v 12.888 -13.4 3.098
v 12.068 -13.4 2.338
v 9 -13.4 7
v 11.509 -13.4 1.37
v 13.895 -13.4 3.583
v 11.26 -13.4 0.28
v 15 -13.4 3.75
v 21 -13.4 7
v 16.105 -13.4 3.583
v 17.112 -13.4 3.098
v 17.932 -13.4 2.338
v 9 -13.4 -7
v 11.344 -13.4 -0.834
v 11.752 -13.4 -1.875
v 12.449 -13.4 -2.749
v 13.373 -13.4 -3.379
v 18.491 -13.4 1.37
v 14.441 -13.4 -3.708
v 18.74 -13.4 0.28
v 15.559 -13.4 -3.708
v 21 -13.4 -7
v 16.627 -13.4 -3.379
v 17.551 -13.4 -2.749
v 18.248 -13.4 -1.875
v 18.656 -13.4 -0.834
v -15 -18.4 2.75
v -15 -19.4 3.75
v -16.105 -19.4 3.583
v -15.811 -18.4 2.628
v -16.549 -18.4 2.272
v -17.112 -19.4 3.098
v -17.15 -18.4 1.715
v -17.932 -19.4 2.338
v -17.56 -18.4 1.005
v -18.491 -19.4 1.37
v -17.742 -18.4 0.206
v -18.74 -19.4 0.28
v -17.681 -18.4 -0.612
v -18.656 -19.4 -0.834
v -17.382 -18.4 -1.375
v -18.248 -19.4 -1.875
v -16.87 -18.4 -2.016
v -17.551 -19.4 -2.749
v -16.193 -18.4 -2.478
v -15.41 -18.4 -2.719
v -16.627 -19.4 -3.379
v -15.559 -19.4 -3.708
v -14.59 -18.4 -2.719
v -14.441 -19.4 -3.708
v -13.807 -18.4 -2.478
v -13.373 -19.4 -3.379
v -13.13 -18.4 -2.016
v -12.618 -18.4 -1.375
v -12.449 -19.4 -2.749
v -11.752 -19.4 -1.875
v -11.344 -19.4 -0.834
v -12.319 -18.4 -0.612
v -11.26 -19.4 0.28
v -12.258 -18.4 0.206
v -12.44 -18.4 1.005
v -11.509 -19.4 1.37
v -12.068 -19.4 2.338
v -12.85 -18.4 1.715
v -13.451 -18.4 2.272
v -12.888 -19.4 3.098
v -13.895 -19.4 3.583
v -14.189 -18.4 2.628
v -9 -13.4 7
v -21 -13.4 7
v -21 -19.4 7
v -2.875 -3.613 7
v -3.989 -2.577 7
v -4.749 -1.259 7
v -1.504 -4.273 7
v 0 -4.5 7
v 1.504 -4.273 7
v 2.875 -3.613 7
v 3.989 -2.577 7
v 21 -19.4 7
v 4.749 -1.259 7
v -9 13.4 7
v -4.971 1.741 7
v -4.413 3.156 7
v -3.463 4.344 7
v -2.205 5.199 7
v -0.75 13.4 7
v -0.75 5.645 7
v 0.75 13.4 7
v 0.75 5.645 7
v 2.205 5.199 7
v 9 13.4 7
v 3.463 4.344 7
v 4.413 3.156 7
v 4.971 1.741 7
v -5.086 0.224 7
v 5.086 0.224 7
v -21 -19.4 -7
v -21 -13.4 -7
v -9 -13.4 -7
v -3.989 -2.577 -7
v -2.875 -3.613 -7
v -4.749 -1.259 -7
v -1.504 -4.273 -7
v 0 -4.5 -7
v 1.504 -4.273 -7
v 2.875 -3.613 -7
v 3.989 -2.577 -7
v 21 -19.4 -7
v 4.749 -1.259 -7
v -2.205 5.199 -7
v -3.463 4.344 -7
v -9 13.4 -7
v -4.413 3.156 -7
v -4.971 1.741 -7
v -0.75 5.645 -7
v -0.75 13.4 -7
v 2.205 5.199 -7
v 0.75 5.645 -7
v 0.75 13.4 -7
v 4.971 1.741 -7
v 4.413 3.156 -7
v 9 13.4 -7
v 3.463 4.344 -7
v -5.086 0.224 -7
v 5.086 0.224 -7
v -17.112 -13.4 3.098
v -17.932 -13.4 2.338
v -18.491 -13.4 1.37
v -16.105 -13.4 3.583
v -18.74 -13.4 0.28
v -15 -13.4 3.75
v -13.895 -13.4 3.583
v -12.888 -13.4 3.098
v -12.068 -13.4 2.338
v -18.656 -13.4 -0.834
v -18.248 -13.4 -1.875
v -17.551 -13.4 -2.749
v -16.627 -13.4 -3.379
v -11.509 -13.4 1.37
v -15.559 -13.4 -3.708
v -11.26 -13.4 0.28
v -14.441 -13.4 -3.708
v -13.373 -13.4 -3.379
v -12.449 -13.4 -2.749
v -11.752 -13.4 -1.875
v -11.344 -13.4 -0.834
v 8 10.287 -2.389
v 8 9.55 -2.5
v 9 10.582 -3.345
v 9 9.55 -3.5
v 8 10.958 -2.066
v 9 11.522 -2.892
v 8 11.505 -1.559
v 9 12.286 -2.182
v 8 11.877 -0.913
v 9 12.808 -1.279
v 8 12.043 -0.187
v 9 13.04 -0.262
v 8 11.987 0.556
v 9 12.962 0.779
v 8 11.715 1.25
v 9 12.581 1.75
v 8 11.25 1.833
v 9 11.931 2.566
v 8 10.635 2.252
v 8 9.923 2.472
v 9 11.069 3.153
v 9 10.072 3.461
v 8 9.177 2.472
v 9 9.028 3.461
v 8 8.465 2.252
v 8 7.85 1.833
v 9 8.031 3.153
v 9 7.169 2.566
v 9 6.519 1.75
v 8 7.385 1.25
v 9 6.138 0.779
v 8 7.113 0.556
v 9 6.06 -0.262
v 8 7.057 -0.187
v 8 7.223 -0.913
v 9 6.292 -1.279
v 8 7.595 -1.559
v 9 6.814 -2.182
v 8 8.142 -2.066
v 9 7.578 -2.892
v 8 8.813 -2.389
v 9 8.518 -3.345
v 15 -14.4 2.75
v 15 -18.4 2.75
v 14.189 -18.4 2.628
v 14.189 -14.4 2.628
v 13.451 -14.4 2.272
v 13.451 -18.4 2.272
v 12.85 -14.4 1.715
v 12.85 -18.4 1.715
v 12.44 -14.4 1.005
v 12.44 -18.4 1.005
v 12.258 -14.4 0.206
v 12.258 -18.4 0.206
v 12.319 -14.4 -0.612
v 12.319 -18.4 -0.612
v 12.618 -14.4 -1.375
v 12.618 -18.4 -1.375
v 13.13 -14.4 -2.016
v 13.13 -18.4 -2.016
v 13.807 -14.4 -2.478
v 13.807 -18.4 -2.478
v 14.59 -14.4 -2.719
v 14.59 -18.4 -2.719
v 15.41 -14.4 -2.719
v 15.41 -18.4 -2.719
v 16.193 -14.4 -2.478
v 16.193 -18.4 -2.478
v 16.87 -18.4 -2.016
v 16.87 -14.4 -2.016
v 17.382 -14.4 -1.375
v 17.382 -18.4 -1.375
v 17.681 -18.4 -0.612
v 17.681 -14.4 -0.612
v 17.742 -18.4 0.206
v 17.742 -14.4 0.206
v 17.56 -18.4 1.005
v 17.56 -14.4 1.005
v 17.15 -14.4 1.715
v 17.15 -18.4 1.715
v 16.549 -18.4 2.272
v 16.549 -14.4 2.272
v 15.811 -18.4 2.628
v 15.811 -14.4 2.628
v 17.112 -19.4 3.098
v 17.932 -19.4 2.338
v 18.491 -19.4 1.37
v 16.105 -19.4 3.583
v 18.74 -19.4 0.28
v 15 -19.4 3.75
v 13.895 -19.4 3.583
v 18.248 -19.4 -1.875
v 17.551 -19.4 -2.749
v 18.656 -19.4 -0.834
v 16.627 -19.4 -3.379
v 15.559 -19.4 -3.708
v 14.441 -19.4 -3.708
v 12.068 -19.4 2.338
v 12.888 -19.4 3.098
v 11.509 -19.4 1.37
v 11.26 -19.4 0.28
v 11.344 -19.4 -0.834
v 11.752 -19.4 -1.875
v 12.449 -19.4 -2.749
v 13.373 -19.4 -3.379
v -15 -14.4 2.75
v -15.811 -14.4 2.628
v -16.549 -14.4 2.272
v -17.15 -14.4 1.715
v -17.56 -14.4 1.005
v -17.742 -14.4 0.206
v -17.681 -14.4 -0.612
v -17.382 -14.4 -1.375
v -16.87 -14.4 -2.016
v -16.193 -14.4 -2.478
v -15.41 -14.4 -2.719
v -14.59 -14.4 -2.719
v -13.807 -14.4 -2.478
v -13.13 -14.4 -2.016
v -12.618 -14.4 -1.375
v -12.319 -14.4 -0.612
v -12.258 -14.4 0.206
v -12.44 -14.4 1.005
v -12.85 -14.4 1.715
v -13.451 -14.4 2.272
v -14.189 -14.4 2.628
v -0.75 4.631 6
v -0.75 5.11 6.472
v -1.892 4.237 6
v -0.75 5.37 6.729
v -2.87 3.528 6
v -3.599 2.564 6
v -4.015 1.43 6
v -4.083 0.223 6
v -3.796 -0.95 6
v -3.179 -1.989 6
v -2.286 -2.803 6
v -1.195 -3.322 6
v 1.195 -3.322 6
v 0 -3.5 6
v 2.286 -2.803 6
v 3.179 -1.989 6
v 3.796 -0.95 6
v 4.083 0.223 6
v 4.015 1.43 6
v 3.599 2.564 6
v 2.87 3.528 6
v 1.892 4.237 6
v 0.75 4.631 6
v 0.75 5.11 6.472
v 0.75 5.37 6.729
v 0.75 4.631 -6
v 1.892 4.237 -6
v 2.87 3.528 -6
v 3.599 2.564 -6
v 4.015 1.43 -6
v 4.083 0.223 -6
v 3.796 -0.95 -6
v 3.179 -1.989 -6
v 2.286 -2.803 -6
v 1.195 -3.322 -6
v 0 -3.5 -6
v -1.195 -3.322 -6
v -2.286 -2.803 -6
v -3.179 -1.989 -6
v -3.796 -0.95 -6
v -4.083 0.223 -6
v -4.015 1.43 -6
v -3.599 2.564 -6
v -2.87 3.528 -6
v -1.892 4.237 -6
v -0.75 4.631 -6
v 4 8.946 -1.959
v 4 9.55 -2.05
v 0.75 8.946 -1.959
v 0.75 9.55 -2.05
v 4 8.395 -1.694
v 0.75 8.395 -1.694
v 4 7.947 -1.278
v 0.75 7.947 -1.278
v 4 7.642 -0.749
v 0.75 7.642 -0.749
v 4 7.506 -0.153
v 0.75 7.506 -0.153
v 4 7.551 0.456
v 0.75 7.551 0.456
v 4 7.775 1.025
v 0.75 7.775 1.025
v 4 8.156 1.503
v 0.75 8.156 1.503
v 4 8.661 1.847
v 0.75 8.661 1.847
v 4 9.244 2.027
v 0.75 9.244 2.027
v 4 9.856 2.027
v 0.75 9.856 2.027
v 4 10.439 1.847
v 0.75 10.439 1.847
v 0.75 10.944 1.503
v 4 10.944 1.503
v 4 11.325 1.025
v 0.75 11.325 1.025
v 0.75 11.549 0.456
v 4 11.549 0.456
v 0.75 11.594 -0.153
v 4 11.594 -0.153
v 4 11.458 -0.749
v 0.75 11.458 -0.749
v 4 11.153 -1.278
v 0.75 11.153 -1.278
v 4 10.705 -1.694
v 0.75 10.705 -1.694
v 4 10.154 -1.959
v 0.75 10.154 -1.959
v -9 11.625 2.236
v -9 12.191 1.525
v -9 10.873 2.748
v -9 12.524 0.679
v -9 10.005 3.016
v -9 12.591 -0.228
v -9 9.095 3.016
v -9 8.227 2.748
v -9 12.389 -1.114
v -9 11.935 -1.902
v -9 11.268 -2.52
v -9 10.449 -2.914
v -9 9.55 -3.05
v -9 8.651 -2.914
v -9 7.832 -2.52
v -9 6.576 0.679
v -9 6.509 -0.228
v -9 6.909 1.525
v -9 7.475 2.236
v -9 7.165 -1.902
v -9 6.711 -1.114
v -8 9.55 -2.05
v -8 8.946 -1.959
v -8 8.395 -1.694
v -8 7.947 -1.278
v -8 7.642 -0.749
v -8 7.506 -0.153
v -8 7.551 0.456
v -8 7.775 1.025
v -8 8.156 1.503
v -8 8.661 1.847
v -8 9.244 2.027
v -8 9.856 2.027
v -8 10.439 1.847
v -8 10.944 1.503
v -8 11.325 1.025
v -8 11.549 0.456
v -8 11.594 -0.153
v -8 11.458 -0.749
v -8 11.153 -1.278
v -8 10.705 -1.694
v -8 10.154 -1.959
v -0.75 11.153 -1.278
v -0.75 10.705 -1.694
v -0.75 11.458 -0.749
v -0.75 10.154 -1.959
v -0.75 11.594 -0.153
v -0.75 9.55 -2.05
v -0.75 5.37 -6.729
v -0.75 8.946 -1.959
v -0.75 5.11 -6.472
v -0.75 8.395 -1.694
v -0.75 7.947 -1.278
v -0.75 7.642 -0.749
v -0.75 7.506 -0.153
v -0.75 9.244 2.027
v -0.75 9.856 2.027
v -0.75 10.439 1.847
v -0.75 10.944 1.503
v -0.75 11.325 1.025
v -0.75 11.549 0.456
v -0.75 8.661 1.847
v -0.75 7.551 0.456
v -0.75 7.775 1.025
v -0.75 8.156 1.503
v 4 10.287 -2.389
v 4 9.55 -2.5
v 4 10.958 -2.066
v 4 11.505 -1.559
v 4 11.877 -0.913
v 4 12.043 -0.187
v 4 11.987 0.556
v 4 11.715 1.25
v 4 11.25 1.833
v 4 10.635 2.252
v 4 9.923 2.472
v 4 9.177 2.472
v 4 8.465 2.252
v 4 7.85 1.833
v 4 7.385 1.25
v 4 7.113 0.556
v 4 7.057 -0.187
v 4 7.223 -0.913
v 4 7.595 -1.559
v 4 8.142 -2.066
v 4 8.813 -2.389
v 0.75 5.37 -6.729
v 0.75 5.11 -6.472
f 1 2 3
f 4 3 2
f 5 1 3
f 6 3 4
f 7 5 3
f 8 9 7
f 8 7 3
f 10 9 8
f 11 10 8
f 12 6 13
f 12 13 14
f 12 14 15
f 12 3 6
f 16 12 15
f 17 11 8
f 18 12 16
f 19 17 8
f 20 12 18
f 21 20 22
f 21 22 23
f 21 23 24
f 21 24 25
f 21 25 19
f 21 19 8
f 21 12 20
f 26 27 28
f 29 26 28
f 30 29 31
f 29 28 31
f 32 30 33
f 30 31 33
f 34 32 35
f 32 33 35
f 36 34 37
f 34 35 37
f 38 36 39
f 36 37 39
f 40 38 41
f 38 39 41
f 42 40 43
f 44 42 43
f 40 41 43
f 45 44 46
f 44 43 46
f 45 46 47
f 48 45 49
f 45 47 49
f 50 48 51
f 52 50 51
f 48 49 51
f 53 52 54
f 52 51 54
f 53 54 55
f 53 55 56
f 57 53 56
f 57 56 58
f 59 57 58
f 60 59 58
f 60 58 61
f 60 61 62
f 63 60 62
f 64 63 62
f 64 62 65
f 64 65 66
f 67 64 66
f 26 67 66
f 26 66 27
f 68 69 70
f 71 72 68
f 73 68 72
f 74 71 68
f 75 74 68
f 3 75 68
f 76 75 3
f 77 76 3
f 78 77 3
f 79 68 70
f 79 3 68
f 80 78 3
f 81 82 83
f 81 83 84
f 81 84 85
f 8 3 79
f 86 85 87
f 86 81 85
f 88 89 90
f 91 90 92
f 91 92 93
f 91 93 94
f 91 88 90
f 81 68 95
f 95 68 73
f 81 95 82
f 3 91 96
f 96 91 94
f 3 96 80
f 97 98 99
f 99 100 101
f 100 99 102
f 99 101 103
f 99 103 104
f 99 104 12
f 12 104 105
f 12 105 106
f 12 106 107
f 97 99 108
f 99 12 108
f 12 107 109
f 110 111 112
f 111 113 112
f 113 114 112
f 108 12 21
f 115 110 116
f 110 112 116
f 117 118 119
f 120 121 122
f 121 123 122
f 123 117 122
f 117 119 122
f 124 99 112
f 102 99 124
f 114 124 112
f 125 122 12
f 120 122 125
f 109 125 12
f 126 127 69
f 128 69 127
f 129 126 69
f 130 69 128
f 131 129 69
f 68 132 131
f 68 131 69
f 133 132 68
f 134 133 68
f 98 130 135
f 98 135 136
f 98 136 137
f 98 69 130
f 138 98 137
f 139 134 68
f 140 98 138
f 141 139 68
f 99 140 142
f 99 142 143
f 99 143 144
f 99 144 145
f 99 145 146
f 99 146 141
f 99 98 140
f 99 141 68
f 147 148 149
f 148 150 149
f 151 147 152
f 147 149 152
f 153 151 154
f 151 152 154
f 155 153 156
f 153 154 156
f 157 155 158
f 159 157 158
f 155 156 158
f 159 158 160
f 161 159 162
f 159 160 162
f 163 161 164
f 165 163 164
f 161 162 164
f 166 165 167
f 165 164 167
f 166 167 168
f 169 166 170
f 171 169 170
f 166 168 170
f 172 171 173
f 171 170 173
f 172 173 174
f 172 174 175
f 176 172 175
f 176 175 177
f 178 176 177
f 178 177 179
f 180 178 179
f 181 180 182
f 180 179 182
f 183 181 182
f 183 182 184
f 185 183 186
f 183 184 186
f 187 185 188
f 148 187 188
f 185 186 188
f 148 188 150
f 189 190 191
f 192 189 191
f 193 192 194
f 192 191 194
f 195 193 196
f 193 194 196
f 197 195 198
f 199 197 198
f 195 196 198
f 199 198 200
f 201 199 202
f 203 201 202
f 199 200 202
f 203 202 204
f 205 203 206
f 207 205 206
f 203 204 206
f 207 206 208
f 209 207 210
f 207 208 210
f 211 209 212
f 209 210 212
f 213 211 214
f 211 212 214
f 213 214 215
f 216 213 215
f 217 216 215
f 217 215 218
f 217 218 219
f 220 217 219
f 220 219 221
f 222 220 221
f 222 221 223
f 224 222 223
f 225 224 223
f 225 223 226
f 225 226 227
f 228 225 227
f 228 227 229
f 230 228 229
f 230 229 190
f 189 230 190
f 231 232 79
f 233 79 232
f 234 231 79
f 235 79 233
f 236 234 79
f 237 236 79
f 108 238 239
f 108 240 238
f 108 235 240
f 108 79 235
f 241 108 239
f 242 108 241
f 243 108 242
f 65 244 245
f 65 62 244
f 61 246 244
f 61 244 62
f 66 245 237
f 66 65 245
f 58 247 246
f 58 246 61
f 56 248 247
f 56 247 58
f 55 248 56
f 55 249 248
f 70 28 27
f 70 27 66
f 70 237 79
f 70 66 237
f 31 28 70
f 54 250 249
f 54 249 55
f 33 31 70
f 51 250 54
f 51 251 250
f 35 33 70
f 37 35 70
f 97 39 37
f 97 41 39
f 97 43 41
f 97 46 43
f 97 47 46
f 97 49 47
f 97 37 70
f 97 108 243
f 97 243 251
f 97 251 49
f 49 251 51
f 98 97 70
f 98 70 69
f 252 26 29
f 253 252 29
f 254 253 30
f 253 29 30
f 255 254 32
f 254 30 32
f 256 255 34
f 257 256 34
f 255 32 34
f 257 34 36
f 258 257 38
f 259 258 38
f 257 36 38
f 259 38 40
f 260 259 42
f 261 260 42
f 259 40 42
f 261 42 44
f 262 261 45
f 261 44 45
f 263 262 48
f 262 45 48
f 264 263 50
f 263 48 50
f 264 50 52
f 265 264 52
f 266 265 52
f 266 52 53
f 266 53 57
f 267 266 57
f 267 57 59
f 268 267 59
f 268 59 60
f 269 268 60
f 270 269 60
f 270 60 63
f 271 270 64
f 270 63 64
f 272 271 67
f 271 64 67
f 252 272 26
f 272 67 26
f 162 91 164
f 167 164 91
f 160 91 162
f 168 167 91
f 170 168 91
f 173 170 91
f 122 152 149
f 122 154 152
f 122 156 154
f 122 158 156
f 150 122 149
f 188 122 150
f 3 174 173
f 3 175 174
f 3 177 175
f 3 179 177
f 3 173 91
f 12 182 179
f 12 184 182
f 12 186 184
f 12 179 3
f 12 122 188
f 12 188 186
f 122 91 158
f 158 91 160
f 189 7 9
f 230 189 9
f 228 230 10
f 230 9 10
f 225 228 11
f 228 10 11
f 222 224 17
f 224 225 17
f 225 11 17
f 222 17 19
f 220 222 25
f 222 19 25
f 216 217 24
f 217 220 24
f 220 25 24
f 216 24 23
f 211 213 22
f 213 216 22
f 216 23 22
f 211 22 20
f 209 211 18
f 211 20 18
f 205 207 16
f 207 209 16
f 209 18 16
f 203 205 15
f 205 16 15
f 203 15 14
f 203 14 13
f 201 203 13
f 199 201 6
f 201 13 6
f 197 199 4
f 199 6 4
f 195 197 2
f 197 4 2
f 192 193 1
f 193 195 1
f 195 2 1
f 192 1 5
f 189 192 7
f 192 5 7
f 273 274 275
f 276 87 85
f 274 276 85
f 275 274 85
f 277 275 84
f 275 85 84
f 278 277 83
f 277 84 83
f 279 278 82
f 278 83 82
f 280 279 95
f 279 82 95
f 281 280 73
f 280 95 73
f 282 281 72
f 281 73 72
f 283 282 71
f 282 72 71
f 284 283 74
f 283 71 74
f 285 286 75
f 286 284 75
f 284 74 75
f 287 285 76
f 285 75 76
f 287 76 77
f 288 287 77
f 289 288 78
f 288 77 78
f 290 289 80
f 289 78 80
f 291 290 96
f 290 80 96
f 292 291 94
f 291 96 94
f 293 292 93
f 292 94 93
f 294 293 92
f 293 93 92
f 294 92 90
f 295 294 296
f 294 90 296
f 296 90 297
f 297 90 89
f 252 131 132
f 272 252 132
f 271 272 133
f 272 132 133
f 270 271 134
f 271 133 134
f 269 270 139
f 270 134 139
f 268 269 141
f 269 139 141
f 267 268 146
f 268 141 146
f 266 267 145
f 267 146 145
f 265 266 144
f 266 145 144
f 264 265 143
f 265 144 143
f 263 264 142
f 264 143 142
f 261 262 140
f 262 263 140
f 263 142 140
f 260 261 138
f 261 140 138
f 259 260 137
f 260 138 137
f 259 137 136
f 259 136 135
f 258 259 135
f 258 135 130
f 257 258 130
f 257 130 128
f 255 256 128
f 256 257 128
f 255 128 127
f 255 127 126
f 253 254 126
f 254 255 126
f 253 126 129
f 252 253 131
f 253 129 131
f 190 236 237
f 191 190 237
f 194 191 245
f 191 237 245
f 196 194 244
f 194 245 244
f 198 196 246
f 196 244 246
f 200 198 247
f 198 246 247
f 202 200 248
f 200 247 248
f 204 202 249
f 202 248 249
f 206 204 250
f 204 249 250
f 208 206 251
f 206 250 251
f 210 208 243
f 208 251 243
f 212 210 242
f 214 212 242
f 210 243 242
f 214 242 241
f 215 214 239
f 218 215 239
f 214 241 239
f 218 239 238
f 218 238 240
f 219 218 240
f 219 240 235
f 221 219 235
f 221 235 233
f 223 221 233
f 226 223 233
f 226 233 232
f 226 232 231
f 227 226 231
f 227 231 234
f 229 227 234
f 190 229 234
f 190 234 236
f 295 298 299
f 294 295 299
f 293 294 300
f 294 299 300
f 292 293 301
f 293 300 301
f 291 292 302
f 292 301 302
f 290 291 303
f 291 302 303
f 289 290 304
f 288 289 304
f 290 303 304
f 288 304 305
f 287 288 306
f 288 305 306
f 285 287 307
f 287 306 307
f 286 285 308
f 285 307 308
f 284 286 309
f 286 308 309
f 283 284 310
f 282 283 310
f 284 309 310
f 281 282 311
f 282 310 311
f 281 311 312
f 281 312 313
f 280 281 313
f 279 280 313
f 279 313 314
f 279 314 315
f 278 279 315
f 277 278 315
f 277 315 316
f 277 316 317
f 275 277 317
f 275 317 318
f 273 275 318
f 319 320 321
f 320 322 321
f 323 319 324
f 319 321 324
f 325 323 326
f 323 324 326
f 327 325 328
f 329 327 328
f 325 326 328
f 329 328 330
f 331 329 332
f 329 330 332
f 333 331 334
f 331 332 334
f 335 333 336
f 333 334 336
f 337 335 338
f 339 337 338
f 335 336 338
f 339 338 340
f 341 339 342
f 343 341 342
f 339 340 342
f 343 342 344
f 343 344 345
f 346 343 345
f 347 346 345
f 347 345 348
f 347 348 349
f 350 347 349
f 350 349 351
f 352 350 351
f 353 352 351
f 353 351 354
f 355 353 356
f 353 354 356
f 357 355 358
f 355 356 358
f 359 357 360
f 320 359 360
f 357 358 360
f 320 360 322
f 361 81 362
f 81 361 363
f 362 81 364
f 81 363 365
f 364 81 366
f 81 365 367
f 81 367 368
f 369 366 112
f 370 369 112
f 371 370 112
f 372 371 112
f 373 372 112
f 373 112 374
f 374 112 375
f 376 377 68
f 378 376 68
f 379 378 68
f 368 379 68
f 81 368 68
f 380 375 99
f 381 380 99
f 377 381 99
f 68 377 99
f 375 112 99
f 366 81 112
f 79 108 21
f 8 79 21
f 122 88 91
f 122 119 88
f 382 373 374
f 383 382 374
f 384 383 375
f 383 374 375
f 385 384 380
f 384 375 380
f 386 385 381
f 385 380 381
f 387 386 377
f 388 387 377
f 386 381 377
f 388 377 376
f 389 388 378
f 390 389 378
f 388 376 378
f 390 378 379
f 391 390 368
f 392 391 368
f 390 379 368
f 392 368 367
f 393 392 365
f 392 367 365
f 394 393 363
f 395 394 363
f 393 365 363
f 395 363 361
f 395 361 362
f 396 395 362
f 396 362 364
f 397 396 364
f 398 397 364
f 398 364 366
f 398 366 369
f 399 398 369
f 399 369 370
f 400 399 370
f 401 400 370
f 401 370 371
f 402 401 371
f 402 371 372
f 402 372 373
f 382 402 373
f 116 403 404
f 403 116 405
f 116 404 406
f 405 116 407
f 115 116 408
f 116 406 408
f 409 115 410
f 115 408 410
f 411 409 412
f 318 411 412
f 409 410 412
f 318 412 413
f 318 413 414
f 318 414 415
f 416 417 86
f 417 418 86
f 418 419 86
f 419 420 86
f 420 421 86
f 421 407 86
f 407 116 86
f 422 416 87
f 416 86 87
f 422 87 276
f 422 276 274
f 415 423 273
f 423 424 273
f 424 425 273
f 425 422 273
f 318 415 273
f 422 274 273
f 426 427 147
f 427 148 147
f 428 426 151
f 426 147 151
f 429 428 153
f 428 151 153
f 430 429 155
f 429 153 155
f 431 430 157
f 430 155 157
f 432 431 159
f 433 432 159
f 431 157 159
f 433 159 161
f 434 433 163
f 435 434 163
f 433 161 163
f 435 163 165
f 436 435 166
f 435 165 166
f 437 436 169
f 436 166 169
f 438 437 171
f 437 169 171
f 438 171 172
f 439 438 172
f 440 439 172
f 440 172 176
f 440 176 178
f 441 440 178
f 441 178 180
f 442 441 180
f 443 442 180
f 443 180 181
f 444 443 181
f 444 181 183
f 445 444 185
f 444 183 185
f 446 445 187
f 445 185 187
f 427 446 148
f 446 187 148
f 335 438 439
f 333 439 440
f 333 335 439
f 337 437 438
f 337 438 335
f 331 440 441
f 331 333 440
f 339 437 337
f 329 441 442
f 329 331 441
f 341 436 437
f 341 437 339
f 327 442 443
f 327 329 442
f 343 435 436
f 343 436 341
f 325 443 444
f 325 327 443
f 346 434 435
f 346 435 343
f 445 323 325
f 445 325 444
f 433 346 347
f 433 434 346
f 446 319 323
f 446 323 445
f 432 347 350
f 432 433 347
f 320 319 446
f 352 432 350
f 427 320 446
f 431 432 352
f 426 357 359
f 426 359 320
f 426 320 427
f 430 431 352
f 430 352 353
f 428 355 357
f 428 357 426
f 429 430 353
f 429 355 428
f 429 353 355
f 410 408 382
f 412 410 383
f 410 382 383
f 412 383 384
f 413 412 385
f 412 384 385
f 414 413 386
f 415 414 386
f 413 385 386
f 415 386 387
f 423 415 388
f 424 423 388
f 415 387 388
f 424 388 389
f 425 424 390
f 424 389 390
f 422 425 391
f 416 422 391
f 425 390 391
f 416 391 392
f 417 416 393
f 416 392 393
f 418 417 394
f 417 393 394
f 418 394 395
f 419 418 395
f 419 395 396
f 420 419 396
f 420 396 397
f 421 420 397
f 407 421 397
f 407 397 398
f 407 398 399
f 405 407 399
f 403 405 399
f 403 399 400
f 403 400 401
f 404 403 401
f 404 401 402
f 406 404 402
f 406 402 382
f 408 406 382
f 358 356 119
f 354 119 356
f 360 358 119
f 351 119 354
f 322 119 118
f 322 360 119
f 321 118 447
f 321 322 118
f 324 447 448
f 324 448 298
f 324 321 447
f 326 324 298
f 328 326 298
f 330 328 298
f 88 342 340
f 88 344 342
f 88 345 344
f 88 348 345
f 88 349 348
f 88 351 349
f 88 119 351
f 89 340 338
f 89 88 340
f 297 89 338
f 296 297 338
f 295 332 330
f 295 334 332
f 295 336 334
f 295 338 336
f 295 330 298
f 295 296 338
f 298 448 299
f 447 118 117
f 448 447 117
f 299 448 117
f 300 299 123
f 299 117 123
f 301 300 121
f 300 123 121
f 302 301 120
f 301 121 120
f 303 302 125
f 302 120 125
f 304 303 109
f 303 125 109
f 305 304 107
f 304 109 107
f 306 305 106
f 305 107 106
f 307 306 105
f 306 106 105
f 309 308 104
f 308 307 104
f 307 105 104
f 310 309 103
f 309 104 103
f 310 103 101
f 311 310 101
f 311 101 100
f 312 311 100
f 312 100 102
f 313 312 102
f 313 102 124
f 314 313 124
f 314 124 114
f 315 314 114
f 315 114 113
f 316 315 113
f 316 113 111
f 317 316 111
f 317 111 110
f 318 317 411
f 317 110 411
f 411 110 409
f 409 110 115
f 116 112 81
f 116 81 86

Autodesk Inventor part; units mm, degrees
ref_plane "YZ Plane" through (0, 0, 0) normal (1, 0, 0) x (0, 1, 0)
ref_plane "XZ Plane" through (0, 0, 0) normal (0, 1, 0) x (-1, 0, 0)
ref_plane "XY Plane" through (0, 0, 0) normal (0, 0, 1) x (1, 0, 0)
sketch "Эскиз1" plane through (0, 0, 0) normal (0, 0, 1) x (1, 0, 0)
  line L0 (-9, 13.4) -> (9, 13.4)
  line L1 (21, -19.4) -> (-21, -19.4)
  line L2 (-21, -19.4) -> (-21, -13.4)
  line L3 (-9, 13.4) -> (-9, -13.4)
  line L4 (9, 13.4) -> (9, -13.4)
  line L5 (21, -19.4) -> (21, -13.4)
  line L6 (-21, -13.4) -> (-9, -13.4)
  line L7 (9, -13.4) -> (21, -13.4)
  point P0 (0, 0)
  point P1 (-9, 0)
  point P2 (0, -19.4)
  dimension "d0" = 42
  dimension "d2" = 18
  dimension "d3" = 9
  dimension "d6" = 6
  dimension "d7" = 32.8
extrude "Выдавливание1" add sketch "Эскиз1" along normal mid plane 14
sketch "Эскиз3" plane through (0, 0, 7) normal (0, 0, 1) x (1, 0, 0)
  line L0 (-21, -19.4) -> (21, -19.4) projected
  point P0 (0, 0)
  point P1 (0, 0.6)
  dimension "d12" = 20
hole "Отверстие1" at (0, 0.6, 7) direction (0, 0, -1) diameter 8.2 end through all
sketch "Эскиз4" plane through (0, 0, 7) normal (0, 0, 1) x (1, 0, 0)
  line L0 (-9, 13.4) -> (9, 13.4) projected
  line L1 (-0.75, 13.4) -> (-0.75, 4.6308)
  circle A0 centre (0, 0.6) radius 4.1 projected
  line L2 (0.75, 13.4) -> (0.75, 4.6308)
  point P0 (0, 0)
  dimension "d20" = 1.5
  dimension "d21" = 0.75
extrude "Выдавливание2" cut sketch "Эскиз4" against normal blind 14 contours L0 L2 A0 L1
sketch "Эскиз6" plane through (9, -13.4, 7) normal (0, 1, 0) x (1, 0, 0)
  line L0 (12, 14) -> (12, 0) projected
  line L1 (0, 14) -> (12, 14) projected
  point P0 (-9, 7)
  point P1 (6, 7)
  point P2 (12, 7)
  point P3 (6, 14)
hole "Отверстие3" at (15, -13.4, 0) direction (0, -1, 0) diameter 5.5 end through all
sketch "Эскиз7" plane through (-21, -13.4, 7) normal (0, 1, 0) x (1, 0, 0)
  line L0 (0, 14) -> (12, 14) projected
  line L1 (0, 0) -> (0, 14) projected
  point P0 (21, 7)
  point P1 (6, 7)
  point P2 (6, 14)
  point P3 (0, 7)
hole "Отверстие4" at (-15, -13.4, 0) direction (0, -1, 0) diameter 5.5 end through all
sketch "Эскиз8" plane through (9, -13.4, 7) normal (1, 0, 0) x (0, 0, -1)
  line L0 (14, 26.8) -> (0, 26.8) projected
  point P0 (7, 13.4)
  point P1 (7, 22.95)
  point P2 (7, 26.8)
  dimension "d50" = 3.85
sketch "Эскиз9" plane through (9, -13.4, 7) normal (1, 0, 0) x (0, 0, -1)
  point P0 (7, 13.4)
hole "Отверстие5" at (9, 9.55, 0) direction (-1, 0, 0) diameter 4.1 end through all
thread "Резьба2" size "M4.5x0.75" class "6H" standard "ANSI Metric M Profile" full length
sketch "Эскиз10" plane through (9, -13.4, 7) normal (1, 0, 0) x (0, 0, -1)
  circle A0 centre (7, 22.95) radius 2.5
  line L0 (14, 26.8) -> (0, 26.8) projected
  point P0 (7, 13.4)
  point P1 (7, 26.8)
  dimension "d60" = 5
  dimension "d61" = 3.85
extrude "Выдавливание3" cut sketch "Эскиз10" against normal blind 5
chamfer "Фаска1" distance 1 angle 45 8 edges at (0, -3.5, 7) (-9, 9.55, 2.05) (-15, -19.4, -2.75) (15, -19.4, -2.75) (0, -3.5, -7) (15, -13.4, -2.75) (-15, -13.4, -2.75) (9, 9.55, 2.5)
properties part number "SK10"
